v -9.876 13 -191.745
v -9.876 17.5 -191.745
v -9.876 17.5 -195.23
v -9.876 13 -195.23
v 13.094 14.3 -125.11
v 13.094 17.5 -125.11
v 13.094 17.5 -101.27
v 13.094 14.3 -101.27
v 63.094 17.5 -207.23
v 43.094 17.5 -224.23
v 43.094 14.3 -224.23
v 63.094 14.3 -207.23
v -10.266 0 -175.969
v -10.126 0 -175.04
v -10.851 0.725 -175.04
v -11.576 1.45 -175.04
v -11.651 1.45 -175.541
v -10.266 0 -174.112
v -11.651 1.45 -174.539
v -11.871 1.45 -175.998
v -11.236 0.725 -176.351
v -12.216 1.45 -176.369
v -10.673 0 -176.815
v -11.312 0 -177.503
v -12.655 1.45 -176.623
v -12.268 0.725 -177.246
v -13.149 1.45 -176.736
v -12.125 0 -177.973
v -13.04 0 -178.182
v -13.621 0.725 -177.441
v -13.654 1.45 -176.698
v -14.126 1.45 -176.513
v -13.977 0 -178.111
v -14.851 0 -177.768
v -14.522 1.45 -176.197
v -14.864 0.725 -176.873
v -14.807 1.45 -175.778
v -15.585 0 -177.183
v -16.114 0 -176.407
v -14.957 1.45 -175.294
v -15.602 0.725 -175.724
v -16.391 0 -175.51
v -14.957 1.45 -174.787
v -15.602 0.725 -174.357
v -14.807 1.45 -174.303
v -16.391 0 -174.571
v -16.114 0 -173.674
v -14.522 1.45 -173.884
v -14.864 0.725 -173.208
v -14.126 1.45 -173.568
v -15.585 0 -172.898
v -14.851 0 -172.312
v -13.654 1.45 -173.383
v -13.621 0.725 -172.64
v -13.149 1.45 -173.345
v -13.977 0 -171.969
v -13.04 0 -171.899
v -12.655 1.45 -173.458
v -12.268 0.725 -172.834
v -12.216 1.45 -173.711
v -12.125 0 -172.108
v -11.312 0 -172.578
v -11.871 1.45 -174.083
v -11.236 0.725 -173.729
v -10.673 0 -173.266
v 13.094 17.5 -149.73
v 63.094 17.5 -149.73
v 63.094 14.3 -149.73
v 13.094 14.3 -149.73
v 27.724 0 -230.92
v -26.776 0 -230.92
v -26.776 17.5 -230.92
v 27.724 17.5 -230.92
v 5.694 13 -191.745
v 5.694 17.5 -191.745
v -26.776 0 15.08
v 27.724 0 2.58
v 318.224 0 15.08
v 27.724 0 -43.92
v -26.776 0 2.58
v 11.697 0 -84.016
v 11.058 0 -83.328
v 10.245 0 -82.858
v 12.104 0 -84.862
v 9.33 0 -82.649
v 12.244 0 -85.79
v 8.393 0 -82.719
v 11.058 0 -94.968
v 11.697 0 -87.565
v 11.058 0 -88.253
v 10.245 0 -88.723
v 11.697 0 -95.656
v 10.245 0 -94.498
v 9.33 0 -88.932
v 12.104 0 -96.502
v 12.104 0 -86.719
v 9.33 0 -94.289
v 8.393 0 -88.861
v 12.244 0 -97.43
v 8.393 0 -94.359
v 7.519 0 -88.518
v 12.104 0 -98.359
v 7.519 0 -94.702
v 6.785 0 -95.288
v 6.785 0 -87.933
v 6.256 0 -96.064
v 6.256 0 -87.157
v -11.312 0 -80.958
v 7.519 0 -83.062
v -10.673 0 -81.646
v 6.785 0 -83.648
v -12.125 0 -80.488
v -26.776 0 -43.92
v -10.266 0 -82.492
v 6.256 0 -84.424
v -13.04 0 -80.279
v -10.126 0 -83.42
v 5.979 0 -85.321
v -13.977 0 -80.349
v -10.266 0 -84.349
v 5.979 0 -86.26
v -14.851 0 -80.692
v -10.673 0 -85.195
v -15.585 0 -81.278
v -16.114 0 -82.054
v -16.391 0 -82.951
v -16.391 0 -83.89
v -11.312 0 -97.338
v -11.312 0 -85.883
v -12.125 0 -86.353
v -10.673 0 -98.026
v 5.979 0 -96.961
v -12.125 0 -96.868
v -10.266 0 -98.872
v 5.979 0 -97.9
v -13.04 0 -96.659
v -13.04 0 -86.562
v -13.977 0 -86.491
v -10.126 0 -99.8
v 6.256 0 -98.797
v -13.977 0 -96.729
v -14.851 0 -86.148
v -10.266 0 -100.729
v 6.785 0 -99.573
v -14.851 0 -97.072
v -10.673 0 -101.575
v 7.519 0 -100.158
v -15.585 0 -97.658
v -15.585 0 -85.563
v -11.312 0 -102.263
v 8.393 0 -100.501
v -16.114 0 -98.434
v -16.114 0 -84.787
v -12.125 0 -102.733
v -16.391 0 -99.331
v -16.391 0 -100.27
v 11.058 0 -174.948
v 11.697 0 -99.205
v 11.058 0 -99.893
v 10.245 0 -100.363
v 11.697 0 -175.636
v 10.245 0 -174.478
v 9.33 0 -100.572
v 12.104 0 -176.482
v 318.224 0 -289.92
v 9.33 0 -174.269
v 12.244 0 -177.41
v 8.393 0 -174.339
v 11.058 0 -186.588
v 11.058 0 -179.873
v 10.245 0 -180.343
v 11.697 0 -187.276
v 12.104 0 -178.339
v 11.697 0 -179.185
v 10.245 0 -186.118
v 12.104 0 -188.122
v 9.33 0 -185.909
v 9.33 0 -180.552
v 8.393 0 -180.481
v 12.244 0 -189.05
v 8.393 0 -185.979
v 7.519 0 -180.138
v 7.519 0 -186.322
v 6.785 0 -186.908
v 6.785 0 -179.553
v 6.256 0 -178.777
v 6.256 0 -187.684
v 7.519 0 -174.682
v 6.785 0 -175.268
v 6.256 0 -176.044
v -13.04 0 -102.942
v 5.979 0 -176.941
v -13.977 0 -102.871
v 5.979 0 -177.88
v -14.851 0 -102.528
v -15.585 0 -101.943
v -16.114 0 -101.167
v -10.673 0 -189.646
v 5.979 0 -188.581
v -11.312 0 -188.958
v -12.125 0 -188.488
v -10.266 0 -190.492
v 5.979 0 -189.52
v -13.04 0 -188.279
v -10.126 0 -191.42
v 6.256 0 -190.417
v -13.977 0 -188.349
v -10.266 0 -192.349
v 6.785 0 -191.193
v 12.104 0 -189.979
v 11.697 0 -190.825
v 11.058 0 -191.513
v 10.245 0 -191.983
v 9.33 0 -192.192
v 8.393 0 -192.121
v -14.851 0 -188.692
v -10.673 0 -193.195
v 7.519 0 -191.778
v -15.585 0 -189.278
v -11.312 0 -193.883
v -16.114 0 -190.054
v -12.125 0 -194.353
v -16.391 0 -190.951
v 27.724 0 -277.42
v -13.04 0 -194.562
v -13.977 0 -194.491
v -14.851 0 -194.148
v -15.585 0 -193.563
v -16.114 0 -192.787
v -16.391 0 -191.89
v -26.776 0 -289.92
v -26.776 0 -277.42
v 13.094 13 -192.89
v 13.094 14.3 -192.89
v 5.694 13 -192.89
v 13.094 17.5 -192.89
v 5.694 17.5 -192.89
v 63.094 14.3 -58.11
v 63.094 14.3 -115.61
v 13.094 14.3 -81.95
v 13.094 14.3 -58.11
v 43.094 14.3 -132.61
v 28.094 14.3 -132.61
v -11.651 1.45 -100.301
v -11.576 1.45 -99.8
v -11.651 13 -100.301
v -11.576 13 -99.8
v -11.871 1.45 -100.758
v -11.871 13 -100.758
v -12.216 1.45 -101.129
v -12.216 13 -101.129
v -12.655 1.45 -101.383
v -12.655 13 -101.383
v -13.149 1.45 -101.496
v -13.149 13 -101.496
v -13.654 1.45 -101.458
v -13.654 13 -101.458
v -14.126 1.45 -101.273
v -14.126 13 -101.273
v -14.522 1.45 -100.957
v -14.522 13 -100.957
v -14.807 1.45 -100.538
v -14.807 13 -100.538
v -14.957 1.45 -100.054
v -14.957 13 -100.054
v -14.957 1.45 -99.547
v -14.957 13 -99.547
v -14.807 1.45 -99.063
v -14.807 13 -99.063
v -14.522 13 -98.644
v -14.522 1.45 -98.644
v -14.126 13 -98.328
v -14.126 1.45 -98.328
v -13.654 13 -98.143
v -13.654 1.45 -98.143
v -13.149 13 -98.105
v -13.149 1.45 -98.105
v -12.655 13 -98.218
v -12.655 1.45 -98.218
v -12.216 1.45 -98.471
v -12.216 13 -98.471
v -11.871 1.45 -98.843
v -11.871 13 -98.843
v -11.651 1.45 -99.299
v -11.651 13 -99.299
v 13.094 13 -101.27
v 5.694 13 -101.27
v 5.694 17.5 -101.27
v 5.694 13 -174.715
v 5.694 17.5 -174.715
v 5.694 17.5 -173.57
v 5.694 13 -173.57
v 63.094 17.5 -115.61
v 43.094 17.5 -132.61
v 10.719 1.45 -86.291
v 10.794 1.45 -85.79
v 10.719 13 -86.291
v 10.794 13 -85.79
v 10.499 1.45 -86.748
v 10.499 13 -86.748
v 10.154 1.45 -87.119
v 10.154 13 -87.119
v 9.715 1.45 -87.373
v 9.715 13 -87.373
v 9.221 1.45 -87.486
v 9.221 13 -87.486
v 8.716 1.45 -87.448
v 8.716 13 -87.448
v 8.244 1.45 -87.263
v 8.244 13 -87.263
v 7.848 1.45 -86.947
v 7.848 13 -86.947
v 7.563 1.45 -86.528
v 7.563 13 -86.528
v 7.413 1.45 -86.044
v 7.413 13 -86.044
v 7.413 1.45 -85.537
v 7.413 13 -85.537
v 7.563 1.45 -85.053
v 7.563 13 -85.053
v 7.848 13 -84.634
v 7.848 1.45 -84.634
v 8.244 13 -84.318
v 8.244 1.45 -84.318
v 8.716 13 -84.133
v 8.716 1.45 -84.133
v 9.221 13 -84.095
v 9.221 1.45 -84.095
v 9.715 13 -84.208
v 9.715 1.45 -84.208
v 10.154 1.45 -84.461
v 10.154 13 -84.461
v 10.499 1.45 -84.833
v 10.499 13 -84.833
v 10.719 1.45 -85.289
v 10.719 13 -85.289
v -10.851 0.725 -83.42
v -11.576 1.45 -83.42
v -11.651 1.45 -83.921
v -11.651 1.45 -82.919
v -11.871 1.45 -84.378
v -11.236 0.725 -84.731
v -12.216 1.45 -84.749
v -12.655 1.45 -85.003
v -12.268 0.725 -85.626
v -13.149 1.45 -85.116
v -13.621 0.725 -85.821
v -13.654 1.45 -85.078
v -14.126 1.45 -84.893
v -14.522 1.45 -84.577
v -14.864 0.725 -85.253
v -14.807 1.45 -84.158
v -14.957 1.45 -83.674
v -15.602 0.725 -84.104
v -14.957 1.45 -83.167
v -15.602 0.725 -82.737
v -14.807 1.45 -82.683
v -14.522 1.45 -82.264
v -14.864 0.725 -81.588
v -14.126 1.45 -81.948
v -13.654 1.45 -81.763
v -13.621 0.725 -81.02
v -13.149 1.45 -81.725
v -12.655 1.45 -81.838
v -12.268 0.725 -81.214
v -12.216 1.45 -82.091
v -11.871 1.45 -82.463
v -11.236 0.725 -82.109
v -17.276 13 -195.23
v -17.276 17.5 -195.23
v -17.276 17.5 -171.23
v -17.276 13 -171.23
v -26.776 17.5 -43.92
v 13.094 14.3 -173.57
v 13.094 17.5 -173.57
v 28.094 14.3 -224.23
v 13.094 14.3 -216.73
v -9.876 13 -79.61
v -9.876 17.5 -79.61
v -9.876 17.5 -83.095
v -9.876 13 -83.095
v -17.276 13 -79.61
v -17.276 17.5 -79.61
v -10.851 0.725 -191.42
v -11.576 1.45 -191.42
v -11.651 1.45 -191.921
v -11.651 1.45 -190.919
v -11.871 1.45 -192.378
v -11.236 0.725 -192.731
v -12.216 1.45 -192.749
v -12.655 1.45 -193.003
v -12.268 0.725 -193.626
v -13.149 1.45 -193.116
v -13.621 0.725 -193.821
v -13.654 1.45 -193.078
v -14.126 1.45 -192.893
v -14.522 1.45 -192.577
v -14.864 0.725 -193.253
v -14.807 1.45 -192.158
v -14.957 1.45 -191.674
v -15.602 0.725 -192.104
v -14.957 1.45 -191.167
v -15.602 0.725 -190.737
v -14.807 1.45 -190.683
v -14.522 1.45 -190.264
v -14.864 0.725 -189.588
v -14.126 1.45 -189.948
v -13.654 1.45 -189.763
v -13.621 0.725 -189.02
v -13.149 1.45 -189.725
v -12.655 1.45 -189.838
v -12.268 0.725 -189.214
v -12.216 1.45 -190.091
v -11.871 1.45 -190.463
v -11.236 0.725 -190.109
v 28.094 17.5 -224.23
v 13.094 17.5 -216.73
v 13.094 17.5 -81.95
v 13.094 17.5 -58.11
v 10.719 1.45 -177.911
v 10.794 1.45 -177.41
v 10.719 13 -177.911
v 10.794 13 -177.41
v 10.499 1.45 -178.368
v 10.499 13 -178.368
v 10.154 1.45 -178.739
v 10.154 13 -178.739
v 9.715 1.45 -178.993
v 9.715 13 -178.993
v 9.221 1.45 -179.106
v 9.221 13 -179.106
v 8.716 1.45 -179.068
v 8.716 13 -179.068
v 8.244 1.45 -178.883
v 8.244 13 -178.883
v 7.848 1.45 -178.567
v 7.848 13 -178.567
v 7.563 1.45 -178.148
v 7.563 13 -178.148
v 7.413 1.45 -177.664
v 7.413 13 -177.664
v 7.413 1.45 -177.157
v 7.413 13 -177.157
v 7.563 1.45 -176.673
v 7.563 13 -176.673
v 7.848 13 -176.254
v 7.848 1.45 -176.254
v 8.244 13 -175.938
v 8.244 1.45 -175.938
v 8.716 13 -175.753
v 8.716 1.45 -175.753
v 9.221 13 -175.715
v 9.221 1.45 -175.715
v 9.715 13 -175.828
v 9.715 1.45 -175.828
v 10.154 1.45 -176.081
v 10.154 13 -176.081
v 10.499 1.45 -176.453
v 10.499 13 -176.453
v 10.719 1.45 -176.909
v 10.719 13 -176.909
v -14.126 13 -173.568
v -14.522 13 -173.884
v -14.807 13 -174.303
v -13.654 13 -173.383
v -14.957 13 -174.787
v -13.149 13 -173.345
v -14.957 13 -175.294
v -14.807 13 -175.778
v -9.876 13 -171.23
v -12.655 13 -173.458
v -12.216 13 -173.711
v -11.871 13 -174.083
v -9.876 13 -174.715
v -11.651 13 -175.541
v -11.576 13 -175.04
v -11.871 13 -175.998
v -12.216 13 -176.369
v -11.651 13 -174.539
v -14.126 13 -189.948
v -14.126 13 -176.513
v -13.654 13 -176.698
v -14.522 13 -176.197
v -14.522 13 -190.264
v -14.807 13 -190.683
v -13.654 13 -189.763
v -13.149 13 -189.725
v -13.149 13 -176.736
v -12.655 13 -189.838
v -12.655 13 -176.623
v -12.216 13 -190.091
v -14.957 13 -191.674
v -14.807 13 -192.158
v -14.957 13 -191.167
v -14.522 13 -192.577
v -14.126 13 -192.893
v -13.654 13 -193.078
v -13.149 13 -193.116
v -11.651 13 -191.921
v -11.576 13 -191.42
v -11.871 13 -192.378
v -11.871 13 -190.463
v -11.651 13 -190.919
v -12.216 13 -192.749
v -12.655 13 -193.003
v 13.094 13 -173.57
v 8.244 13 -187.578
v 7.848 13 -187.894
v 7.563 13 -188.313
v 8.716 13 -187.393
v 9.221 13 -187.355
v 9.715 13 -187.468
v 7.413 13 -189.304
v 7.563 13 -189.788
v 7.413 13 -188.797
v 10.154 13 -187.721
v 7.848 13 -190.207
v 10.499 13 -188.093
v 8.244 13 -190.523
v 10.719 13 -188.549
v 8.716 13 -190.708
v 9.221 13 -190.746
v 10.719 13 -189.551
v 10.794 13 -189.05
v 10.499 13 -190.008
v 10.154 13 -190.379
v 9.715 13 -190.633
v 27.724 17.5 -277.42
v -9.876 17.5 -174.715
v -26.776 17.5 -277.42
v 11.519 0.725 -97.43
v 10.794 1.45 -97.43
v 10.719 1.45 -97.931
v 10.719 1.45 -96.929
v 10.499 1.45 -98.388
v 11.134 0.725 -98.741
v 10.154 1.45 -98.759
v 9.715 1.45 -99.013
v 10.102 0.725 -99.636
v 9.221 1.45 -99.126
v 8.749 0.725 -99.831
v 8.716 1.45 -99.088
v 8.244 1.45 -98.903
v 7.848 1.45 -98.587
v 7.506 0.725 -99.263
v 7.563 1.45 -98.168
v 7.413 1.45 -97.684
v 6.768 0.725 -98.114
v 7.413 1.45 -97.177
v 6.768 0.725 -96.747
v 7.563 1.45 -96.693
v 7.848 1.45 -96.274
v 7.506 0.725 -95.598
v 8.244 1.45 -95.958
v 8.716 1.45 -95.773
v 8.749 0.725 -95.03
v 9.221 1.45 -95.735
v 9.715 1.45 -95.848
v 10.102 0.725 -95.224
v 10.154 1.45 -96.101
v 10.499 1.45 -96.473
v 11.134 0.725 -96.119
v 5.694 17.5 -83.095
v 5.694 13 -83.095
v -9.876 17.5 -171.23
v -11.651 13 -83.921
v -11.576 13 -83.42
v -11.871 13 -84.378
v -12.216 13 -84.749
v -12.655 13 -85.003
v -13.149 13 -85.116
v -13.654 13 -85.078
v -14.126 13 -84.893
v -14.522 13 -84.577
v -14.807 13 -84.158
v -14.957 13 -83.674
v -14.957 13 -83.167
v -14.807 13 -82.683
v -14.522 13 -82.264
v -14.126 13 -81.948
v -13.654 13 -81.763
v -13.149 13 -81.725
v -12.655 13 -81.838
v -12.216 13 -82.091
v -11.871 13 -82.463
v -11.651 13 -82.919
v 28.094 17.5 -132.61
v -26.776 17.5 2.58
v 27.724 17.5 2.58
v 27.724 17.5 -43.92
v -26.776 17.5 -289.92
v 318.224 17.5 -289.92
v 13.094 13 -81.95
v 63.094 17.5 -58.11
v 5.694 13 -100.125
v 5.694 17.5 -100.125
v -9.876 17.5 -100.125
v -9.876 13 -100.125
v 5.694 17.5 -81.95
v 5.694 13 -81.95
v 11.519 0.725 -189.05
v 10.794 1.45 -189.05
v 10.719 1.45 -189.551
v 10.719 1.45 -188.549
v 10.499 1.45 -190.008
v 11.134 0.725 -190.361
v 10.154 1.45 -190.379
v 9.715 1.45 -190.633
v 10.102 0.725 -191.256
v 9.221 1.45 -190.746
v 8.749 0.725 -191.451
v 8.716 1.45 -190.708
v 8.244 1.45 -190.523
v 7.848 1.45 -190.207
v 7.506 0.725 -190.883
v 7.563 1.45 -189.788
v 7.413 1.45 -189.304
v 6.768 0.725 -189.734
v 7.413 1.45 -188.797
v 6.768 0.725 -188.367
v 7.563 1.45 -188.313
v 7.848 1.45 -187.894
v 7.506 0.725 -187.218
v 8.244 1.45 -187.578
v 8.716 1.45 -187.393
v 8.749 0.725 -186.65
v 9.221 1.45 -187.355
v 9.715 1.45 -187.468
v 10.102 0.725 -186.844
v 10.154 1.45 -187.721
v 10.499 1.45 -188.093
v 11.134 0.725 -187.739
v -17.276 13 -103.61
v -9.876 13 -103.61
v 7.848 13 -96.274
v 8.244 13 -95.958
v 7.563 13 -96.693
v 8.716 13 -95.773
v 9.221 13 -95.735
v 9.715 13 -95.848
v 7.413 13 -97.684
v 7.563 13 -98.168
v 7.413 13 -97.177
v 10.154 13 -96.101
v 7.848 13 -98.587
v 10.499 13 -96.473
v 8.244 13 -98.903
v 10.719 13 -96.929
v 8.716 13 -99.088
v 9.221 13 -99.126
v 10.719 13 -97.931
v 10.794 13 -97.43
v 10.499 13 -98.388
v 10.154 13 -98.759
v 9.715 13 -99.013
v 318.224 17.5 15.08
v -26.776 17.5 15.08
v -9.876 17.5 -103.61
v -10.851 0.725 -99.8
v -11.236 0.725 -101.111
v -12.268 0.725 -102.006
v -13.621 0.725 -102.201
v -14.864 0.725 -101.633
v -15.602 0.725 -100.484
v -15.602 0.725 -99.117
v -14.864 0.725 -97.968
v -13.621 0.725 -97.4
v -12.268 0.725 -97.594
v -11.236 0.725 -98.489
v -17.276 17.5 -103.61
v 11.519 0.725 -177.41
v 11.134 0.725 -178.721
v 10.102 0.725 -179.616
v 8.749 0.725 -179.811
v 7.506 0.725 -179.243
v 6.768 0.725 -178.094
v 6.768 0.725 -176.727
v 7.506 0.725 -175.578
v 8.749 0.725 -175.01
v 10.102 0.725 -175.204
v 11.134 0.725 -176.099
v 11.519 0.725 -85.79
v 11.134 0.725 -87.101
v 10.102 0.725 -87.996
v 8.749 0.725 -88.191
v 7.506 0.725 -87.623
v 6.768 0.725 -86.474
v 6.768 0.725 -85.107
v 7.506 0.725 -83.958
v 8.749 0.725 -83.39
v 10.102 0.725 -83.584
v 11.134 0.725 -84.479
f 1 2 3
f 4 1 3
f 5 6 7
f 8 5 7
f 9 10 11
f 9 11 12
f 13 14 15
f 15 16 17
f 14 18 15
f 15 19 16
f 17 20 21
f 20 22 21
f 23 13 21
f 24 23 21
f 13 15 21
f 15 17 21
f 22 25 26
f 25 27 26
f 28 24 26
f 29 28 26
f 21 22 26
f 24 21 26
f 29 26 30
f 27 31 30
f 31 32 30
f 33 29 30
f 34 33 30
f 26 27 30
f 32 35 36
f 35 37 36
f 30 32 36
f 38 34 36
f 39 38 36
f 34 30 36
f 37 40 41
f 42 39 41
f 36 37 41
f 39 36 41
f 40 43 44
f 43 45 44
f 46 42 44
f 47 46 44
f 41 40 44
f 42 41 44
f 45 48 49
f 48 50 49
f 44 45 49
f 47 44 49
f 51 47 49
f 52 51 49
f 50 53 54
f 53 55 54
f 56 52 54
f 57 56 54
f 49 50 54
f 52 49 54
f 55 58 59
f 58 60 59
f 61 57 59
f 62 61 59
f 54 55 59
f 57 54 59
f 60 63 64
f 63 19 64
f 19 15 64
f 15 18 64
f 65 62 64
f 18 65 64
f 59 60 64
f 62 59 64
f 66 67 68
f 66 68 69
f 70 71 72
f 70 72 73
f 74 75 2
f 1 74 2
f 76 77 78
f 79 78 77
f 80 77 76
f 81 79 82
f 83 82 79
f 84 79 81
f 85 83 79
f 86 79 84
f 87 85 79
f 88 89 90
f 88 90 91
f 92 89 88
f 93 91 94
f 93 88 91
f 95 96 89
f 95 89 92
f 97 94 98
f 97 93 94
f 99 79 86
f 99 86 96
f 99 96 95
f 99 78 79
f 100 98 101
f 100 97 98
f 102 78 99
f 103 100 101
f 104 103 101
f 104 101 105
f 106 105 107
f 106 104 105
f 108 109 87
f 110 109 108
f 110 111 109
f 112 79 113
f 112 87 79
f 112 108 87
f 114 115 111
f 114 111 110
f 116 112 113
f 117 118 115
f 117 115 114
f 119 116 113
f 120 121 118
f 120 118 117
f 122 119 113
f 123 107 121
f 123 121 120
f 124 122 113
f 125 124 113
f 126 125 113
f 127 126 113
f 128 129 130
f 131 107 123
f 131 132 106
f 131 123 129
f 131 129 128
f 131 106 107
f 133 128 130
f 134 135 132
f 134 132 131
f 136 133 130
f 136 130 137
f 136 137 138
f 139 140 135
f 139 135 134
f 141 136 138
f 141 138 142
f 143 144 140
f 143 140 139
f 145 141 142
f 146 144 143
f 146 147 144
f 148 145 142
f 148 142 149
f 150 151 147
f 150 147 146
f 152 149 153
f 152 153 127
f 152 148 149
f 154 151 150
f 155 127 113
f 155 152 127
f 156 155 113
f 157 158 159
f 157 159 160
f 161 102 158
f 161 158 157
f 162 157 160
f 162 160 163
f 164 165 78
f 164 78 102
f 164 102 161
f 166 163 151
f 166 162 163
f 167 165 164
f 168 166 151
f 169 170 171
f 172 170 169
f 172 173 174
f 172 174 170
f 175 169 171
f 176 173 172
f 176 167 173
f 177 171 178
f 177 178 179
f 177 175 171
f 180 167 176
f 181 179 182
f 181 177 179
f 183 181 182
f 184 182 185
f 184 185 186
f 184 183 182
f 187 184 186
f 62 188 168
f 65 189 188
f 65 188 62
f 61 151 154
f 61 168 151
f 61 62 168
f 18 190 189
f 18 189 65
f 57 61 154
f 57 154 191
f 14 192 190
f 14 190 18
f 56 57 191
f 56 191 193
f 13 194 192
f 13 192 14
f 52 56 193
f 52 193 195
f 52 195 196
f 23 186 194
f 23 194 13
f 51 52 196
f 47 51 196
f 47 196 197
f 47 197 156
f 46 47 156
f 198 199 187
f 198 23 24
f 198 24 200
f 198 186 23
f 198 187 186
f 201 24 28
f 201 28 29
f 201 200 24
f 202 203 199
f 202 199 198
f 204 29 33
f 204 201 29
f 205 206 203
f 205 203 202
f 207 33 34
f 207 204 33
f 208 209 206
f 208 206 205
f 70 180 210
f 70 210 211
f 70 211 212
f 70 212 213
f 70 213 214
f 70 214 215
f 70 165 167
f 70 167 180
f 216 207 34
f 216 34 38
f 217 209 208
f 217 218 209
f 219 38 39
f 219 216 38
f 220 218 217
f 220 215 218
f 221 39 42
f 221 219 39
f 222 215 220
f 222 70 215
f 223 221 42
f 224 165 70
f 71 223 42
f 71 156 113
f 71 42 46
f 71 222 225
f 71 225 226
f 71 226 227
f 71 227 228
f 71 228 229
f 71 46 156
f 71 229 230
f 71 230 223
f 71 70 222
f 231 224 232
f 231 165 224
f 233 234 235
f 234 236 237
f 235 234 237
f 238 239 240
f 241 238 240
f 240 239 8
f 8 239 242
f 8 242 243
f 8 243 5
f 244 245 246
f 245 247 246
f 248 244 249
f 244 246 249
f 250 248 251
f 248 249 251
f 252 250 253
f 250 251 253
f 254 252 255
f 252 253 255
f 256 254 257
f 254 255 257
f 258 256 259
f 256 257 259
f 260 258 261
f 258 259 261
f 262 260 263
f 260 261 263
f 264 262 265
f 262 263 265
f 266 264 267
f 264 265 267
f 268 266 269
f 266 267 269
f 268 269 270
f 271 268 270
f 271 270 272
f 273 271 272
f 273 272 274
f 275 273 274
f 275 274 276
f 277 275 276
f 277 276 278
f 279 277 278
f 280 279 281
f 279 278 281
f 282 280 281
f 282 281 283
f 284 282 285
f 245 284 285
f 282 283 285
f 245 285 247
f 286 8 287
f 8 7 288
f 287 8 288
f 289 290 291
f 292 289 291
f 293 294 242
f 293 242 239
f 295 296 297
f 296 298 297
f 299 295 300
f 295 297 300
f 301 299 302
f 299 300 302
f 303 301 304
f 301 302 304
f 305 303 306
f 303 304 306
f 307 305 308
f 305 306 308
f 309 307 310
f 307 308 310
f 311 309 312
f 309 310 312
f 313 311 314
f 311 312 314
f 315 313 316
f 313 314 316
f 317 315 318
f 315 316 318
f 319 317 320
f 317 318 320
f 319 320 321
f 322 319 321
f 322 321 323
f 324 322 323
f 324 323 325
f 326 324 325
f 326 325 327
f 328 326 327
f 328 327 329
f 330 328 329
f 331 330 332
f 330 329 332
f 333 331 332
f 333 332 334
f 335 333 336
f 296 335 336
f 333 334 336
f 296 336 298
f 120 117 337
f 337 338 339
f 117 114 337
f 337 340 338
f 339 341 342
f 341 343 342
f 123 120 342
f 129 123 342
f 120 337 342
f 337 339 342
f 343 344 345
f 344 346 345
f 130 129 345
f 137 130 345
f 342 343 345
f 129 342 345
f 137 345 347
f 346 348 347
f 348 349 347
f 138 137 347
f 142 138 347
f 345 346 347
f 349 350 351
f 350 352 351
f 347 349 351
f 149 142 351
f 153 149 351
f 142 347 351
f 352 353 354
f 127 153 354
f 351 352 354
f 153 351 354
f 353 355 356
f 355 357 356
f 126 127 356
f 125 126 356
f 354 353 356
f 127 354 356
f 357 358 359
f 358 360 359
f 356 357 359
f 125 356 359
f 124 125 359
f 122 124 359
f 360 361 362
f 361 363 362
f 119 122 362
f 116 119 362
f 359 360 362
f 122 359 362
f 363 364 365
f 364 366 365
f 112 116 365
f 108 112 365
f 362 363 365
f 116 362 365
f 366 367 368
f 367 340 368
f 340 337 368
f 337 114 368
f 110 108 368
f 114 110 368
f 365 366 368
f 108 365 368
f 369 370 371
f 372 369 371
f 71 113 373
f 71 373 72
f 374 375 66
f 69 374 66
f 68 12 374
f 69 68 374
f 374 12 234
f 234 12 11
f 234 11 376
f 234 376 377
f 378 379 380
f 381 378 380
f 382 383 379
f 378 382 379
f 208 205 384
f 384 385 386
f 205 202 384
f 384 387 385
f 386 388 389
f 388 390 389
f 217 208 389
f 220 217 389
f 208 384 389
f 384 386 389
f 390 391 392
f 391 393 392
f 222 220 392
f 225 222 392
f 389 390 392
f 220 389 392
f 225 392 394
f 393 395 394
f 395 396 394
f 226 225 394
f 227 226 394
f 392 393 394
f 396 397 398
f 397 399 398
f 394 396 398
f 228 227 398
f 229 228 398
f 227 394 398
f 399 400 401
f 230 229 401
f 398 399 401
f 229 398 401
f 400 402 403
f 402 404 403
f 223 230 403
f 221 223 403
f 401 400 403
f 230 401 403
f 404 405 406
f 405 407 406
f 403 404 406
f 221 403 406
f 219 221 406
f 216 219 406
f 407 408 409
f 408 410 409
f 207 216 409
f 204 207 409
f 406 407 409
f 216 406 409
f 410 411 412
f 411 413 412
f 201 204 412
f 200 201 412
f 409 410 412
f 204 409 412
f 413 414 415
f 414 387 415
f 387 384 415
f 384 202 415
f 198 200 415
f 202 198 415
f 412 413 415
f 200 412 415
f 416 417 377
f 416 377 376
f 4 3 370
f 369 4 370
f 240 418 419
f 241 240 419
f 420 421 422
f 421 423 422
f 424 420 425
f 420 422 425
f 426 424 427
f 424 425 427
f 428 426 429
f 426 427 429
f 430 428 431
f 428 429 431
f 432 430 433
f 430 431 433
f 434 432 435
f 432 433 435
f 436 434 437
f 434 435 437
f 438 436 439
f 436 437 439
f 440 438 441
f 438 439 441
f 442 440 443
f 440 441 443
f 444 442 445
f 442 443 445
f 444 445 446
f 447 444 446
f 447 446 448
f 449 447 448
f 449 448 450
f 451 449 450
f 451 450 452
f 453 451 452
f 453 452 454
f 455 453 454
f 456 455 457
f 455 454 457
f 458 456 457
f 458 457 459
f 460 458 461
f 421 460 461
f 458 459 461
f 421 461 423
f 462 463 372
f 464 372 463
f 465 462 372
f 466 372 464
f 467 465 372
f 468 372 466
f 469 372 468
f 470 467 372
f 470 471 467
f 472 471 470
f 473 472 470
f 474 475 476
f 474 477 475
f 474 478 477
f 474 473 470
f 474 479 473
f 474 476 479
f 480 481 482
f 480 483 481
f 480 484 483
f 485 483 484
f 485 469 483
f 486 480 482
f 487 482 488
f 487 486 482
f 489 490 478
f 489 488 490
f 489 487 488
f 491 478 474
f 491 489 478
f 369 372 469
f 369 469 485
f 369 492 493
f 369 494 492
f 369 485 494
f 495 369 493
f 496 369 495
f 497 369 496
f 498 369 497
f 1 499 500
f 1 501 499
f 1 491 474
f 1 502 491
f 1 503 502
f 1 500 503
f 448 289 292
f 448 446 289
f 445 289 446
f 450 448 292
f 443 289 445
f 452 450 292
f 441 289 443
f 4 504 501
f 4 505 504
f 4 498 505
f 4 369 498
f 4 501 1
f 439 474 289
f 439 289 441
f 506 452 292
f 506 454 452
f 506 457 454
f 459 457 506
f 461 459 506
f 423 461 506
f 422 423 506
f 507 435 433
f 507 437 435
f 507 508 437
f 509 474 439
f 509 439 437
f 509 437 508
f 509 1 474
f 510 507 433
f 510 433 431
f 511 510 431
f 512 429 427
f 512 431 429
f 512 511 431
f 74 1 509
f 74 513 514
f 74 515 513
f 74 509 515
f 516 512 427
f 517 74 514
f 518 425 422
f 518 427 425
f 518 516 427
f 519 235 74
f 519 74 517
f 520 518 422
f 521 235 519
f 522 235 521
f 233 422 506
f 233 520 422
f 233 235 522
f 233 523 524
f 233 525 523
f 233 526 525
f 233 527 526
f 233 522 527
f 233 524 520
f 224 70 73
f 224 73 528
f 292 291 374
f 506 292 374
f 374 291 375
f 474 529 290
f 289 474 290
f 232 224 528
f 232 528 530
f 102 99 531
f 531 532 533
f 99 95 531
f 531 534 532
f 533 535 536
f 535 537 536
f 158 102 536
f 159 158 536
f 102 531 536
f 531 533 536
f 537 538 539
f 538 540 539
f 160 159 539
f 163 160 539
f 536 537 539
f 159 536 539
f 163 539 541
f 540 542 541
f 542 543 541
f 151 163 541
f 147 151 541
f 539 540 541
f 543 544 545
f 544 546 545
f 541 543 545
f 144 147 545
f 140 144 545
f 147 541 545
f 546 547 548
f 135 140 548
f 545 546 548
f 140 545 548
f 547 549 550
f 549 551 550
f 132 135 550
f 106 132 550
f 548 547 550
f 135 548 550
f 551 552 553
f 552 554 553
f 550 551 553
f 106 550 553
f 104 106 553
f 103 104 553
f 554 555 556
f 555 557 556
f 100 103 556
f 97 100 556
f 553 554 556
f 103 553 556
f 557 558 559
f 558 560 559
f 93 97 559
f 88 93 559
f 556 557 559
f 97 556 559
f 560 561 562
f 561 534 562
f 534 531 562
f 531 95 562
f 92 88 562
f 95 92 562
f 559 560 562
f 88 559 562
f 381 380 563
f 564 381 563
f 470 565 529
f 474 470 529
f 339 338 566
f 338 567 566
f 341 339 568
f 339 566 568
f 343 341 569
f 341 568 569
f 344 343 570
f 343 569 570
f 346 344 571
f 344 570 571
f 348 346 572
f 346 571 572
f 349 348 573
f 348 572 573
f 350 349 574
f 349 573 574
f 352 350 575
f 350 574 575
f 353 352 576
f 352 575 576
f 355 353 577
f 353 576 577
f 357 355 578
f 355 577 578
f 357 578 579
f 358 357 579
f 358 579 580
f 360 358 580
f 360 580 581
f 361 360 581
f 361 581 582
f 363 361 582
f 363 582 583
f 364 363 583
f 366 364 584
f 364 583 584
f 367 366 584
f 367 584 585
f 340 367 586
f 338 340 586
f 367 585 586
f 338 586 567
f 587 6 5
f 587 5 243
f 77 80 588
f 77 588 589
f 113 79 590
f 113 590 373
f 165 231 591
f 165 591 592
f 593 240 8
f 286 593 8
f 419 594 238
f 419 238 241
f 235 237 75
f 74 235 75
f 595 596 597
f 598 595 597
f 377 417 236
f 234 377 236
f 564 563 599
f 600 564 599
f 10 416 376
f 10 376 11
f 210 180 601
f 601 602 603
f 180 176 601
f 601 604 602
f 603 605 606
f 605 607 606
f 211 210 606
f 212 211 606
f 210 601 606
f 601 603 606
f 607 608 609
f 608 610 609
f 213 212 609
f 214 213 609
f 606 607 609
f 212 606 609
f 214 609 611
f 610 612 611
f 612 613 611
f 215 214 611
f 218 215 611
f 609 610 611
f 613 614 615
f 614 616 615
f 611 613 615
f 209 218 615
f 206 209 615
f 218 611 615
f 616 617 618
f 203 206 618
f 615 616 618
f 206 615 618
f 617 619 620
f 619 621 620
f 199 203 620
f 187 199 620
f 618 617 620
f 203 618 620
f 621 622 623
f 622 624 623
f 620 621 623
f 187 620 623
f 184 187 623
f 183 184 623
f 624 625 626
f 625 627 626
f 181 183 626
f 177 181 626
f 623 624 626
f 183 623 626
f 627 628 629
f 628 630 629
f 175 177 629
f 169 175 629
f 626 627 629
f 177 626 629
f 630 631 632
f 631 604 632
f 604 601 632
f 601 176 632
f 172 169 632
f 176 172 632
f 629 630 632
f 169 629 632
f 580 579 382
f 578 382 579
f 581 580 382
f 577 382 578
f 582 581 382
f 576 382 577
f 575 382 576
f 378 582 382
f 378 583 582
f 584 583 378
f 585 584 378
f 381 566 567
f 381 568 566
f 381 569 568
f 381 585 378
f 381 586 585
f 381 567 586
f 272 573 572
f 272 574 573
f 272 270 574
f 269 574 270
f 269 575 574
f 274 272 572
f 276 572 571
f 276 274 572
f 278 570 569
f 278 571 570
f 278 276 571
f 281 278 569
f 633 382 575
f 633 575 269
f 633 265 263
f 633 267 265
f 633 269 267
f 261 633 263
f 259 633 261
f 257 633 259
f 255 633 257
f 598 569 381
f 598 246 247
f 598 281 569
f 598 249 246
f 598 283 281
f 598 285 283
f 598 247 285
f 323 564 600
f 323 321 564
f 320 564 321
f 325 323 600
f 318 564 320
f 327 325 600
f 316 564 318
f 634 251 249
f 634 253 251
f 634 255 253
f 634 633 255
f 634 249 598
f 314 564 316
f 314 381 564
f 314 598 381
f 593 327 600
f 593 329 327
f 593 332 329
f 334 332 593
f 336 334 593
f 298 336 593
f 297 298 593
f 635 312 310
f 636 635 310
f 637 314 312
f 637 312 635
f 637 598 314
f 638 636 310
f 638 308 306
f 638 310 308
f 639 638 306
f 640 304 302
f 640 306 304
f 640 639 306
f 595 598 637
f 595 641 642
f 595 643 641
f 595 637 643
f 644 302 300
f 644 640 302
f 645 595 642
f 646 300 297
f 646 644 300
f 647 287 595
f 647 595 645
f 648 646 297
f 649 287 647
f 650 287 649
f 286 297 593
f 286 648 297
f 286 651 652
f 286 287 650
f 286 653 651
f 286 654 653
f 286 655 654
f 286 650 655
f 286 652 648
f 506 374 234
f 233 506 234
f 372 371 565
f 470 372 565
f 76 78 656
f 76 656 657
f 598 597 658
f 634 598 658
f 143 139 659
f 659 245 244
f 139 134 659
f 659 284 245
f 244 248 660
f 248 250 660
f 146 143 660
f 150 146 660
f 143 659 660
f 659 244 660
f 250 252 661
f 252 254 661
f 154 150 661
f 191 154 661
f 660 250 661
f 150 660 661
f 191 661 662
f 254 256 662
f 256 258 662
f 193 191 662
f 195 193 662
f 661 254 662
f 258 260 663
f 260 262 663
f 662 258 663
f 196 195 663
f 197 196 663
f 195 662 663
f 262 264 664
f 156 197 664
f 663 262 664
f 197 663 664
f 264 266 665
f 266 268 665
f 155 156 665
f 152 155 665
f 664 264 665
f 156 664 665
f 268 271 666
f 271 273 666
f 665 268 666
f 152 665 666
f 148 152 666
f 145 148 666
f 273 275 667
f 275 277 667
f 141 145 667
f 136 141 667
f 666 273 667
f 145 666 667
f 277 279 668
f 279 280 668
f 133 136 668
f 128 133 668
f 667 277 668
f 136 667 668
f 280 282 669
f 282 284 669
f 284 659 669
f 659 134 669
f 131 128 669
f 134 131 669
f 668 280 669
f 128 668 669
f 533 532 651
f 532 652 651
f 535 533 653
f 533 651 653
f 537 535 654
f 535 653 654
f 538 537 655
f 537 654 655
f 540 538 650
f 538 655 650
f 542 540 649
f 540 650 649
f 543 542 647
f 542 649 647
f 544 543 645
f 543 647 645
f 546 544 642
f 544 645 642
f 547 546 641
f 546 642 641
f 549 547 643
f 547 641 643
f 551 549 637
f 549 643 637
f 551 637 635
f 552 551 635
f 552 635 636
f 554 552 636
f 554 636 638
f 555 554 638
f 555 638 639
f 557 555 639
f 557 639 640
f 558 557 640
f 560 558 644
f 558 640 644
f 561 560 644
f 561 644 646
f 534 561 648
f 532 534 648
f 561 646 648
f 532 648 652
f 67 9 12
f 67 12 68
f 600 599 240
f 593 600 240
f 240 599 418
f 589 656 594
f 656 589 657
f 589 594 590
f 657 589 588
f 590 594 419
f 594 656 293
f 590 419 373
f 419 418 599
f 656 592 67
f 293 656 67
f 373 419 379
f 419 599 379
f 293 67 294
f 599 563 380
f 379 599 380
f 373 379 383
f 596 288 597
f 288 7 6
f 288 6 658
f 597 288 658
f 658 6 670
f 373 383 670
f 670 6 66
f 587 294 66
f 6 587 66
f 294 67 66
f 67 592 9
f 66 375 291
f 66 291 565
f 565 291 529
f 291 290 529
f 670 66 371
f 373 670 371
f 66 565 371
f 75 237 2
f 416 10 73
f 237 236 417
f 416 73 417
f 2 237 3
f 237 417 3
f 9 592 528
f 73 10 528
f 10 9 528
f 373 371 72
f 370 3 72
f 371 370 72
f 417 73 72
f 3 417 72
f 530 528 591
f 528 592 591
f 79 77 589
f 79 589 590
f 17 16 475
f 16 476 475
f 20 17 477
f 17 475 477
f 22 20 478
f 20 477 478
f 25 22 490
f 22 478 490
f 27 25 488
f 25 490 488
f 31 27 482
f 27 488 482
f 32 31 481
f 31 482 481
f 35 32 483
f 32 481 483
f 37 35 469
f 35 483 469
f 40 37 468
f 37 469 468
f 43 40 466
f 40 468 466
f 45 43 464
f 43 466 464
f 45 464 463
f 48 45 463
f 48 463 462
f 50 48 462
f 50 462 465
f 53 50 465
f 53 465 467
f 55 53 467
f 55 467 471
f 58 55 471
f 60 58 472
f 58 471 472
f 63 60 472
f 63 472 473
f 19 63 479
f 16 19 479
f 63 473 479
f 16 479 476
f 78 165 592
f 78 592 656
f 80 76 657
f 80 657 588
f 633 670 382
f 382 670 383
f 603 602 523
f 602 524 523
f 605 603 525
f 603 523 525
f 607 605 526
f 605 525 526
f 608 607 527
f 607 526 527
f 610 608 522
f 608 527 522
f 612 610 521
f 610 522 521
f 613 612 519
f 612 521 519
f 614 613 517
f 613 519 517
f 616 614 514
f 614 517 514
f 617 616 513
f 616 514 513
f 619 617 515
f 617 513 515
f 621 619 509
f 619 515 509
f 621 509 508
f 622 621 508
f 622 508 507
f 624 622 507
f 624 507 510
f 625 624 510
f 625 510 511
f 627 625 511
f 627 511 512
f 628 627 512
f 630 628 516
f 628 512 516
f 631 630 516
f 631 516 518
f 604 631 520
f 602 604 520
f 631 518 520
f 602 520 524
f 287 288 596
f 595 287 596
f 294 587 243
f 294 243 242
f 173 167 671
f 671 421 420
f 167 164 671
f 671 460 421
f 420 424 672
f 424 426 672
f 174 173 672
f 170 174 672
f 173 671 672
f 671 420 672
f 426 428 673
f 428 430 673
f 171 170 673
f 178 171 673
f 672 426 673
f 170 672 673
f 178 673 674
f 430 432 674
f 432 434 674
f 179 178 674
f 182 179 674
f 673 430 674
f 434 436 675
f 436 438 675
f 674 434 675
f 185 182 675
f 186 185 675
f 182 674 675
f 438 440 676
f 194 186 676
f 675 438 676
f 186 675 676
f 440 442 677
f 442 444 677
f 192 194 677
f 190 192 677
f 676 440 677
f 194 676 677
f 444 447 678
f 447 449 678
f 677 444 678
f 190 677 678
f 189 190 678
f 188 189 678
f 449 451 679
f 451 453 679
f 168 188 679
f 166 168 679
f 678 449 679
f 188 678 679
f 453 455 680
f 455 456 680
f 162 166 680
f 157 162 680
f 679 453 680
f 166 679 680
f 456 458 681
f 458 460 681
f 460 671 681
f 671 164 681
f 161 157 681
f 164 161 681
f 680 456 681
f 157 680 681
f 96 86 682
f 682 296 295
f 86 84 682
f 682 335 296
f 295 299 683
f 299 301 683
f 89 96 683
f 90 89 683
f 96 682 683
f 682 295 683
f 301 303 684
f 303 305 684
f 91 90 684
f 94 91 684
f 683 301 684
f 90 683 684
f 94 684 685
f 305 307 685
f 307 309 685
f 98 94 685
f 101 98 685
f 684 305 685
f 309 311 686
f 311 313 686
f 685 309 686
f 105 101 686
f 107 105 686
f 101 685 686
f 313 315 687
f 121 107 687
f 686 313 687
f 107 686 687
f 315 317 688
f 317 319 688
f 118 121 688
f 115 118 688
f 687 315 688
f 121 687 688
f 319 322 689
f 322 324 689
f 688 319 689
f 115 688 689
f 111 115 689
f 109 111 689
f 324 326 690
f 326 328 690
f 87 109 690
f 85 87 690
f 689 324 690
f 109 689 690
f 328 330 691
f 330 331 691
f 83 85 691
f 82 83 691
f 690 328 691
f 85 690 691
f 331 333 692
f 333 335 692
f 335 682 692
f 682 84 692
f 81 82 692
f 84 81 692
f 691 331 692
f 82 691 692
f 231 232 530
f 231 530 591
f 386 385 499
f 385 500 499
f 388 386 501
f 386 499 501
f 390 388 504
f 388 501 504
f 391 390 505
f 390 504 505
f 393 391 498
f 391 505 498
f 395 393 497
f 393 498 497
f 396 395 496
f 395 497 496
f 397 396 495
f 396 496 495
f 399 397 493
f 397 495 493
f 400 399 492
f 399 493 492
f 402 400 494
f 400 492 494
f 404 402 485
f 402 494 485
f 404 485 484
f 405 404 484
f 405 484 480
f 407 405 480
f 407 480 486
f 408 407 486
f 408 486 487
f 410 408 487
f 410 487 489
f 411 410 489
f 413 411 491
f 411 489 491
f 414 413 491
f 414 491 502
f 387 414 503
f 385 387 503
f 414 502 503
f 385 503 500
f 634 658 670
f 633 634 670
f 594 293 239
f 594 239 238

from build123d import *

# Parameters (mm, degrees)
BOSS_EXTRUDE1_DEPTH                             = 17.5
SKETCH2_R                                       = 1.5
CUT_EXTRUDE1_DEPTH                              = 4.5
CSK_FOR_M3_OVAL_HEAD_MACHINE_SCREW1_D           = 3.4
CSK_FOR_M3_OVAL_HEAD_MACHINE_SCREW1_CSINK_D     = 6.3
CSK_FOR_M3_OVAL_HEAD_MACHINE_SCREW1_CSINK_ANGLE = 90
CUT_EXTRUDE2_DEPTH                              = 3.2


with BuildPart() as part:
    # Sketch1 → Boss-Extrude1 (new body)
    with BuildSketch(Plane(origin=(0, 0, 0), x_dir=(1, 0, 0), z_dir=(0, 1, 0))):
        Polygon((27.724299065, -2.579662371), (27.724299065, 43.920337629), (-26.775700935, 43.920337629), (-26.775700935, 230.920337629), (27.724299065, 230.920337629), (27.724299065, 277.420337629), (-26.775700935, 277.420337629), (-26.775700935, 289.920337629), (318.224299065, 289.920337629), (318.224299065, -15.079662371), (-26.775700935, -15.079662371), (-26.775700935, -2.579662371), align=None)
    extrude(amount=BOSS_EXTRUDE1_DEPTH)

    # Sketch2 → Cut-Extrude1 (cut)
    # profile 1 of 2: a face of its own
    with BuildSketch(Plane(origin=(0, 17.5, 0), x_dir=(1, 0, 0), z_dir=(0, 1, 0))):
        Polygon((5.694299065, 191.745337629), (-9.875700935, 191.745337629), (-9.875700935, 195.230337629), (-17.275700935, 195.230337629), (-17.275700935, 171.230337629), (-9.875700935, 171.230337629), (-9.875700935, 174.715337629), (5.694299065, 174.715337629), (5.694299065, 173.570337629), (13.094299065, 173.570337629), (13.094299065, 192.890337629), (5.694299065, 192.890337629), align=None)
        with Locations(Location((-13.275700935, 191.420337629, 0), (0, 0, 270))):
            Circle(SKETCH2_R, mode=Mode.SUBTRACT)
        with Locations(Location((-13.275700935, 175.040337629, 0), (0, 0, 270))):
            Circle(SKETCH2_R, mode=Mode.SUBTRACT)
        with Locations(Location((9.094299065, 189.050337629, 0), (0, 0, 270))):
            Circle(SKETCH2_R, mode=Mode.SUBTRACT)
        with Locations(Location((9.094299065, 177.410337629, 0), (0, 0, 270))):
            Circle(SKETCH2_R, mode=Mode.SUBTRACT)
    # profile 2 of 2: a face of its own
    with BuildSketch(Plane(origin=(0, 17.5, 0), x_dir=(1, 0, 0), z_dir=(0, 1, 0))):
        Polygon((5.694299065, 100.125337629), (-9.875700935, 100.125337629), (-9.875700935, 103.610337629), (-17.275700935, 103.610337629), (-17.275700935, 79.610337629), (-9.875700935, 79.610337629), (-9.875700935, 83.095337629), (5.694299065, 83.095337629), (5.694299065, 81.950337629), (13.094299065, 81.950337629), (13.094299065, 101.270337629), (5.694299065, 101.270337629), align=None)
        with Locations(Location((-13.275700935, 99.800337629, 0), (0, 0, 270))):
            Circle(SKETCH2_R, mode=Mode.SUBTRACT)
        with Locations(Location((-13.275700935, 83.420337629, 0), (0, 0, 270))):
            Circle(SKETCH2_R, mode=Mode.SUBTRACT)
        with Locations(Location((9.094299065, 97.430337629, 0), (0, 0, 270))):
            Circle(SKETCH2_R, mode=Mode.SUBTRACT)
        with Locations(Location((9.094299065, 85.790337629, 0), (0, 0, 270))):
            Circle(SKETCH2_R, mode=Mode.SUBTRACT)
    extrude(amount=-CUT_EXTRUDE1_DEPTH, mode=Mode.SUBTRACT)

    # CSK for M3 Oval Head Machine Screw1 (through all)
    with Locations(Plane(origin=(0, 0, 0), x_dir=(-1, 0, 0), z_dir=(0, -1, 0))):
        with Locations((13.275700935, 191.420337629), (13.275700935, 175.040337629), (-9.094299065, 177.410337629), (-9.094299065, 189.050337629), (13.275700935, 83.420337629), (13.275700935, 99.800337629), (-9.094299065, 97.430337629), (-9.094299065, 85.790337629)):
            CounterSinkHole(CSK_FOR_M3_OVAL_HEAD_MACHINE_SCREW1_D / 2, CSK_FOR_M3_OVAL_HEAD_MACHINE_SCREW1_CSINK_D / 2, counter_sink_angle=CSK_FOR_M3_OVAL_HEAD_MACHINE_SCREW1_CSINK_ANGLE)

    # Sketch7 → Cut-Extrude2 (cut)
    with BuildSketch(Plane(origin=(0, 17.5, 0), x_dir=(1, 0, 0), z_dir=(0, 1, 0))):
        Polygon((13.094299065, 183.230337629), (13.094299065, 216.730337629), (28.094299065, 224.230337629), (43.094299065, 224.230337629), (63.094299065, 207.230337629), (63.094299065, 149.730337629), (13.094299065, 149.730337629), align=None)
        Polygon((13.094299065, 91.610337629), (13.094299065, 125.110337629), (28.094299065, 132.610337629), (43.094299065, 132.610337629), (63.094299065, 115.610337629), (63.094299065, 58.110337629), (13.094299065, 58.110337629), align=None)
    extrude(amount=-CUT_EXTRUDE2_DEPTH, mode=Mode.SUBTRACT)


solid = part.part
